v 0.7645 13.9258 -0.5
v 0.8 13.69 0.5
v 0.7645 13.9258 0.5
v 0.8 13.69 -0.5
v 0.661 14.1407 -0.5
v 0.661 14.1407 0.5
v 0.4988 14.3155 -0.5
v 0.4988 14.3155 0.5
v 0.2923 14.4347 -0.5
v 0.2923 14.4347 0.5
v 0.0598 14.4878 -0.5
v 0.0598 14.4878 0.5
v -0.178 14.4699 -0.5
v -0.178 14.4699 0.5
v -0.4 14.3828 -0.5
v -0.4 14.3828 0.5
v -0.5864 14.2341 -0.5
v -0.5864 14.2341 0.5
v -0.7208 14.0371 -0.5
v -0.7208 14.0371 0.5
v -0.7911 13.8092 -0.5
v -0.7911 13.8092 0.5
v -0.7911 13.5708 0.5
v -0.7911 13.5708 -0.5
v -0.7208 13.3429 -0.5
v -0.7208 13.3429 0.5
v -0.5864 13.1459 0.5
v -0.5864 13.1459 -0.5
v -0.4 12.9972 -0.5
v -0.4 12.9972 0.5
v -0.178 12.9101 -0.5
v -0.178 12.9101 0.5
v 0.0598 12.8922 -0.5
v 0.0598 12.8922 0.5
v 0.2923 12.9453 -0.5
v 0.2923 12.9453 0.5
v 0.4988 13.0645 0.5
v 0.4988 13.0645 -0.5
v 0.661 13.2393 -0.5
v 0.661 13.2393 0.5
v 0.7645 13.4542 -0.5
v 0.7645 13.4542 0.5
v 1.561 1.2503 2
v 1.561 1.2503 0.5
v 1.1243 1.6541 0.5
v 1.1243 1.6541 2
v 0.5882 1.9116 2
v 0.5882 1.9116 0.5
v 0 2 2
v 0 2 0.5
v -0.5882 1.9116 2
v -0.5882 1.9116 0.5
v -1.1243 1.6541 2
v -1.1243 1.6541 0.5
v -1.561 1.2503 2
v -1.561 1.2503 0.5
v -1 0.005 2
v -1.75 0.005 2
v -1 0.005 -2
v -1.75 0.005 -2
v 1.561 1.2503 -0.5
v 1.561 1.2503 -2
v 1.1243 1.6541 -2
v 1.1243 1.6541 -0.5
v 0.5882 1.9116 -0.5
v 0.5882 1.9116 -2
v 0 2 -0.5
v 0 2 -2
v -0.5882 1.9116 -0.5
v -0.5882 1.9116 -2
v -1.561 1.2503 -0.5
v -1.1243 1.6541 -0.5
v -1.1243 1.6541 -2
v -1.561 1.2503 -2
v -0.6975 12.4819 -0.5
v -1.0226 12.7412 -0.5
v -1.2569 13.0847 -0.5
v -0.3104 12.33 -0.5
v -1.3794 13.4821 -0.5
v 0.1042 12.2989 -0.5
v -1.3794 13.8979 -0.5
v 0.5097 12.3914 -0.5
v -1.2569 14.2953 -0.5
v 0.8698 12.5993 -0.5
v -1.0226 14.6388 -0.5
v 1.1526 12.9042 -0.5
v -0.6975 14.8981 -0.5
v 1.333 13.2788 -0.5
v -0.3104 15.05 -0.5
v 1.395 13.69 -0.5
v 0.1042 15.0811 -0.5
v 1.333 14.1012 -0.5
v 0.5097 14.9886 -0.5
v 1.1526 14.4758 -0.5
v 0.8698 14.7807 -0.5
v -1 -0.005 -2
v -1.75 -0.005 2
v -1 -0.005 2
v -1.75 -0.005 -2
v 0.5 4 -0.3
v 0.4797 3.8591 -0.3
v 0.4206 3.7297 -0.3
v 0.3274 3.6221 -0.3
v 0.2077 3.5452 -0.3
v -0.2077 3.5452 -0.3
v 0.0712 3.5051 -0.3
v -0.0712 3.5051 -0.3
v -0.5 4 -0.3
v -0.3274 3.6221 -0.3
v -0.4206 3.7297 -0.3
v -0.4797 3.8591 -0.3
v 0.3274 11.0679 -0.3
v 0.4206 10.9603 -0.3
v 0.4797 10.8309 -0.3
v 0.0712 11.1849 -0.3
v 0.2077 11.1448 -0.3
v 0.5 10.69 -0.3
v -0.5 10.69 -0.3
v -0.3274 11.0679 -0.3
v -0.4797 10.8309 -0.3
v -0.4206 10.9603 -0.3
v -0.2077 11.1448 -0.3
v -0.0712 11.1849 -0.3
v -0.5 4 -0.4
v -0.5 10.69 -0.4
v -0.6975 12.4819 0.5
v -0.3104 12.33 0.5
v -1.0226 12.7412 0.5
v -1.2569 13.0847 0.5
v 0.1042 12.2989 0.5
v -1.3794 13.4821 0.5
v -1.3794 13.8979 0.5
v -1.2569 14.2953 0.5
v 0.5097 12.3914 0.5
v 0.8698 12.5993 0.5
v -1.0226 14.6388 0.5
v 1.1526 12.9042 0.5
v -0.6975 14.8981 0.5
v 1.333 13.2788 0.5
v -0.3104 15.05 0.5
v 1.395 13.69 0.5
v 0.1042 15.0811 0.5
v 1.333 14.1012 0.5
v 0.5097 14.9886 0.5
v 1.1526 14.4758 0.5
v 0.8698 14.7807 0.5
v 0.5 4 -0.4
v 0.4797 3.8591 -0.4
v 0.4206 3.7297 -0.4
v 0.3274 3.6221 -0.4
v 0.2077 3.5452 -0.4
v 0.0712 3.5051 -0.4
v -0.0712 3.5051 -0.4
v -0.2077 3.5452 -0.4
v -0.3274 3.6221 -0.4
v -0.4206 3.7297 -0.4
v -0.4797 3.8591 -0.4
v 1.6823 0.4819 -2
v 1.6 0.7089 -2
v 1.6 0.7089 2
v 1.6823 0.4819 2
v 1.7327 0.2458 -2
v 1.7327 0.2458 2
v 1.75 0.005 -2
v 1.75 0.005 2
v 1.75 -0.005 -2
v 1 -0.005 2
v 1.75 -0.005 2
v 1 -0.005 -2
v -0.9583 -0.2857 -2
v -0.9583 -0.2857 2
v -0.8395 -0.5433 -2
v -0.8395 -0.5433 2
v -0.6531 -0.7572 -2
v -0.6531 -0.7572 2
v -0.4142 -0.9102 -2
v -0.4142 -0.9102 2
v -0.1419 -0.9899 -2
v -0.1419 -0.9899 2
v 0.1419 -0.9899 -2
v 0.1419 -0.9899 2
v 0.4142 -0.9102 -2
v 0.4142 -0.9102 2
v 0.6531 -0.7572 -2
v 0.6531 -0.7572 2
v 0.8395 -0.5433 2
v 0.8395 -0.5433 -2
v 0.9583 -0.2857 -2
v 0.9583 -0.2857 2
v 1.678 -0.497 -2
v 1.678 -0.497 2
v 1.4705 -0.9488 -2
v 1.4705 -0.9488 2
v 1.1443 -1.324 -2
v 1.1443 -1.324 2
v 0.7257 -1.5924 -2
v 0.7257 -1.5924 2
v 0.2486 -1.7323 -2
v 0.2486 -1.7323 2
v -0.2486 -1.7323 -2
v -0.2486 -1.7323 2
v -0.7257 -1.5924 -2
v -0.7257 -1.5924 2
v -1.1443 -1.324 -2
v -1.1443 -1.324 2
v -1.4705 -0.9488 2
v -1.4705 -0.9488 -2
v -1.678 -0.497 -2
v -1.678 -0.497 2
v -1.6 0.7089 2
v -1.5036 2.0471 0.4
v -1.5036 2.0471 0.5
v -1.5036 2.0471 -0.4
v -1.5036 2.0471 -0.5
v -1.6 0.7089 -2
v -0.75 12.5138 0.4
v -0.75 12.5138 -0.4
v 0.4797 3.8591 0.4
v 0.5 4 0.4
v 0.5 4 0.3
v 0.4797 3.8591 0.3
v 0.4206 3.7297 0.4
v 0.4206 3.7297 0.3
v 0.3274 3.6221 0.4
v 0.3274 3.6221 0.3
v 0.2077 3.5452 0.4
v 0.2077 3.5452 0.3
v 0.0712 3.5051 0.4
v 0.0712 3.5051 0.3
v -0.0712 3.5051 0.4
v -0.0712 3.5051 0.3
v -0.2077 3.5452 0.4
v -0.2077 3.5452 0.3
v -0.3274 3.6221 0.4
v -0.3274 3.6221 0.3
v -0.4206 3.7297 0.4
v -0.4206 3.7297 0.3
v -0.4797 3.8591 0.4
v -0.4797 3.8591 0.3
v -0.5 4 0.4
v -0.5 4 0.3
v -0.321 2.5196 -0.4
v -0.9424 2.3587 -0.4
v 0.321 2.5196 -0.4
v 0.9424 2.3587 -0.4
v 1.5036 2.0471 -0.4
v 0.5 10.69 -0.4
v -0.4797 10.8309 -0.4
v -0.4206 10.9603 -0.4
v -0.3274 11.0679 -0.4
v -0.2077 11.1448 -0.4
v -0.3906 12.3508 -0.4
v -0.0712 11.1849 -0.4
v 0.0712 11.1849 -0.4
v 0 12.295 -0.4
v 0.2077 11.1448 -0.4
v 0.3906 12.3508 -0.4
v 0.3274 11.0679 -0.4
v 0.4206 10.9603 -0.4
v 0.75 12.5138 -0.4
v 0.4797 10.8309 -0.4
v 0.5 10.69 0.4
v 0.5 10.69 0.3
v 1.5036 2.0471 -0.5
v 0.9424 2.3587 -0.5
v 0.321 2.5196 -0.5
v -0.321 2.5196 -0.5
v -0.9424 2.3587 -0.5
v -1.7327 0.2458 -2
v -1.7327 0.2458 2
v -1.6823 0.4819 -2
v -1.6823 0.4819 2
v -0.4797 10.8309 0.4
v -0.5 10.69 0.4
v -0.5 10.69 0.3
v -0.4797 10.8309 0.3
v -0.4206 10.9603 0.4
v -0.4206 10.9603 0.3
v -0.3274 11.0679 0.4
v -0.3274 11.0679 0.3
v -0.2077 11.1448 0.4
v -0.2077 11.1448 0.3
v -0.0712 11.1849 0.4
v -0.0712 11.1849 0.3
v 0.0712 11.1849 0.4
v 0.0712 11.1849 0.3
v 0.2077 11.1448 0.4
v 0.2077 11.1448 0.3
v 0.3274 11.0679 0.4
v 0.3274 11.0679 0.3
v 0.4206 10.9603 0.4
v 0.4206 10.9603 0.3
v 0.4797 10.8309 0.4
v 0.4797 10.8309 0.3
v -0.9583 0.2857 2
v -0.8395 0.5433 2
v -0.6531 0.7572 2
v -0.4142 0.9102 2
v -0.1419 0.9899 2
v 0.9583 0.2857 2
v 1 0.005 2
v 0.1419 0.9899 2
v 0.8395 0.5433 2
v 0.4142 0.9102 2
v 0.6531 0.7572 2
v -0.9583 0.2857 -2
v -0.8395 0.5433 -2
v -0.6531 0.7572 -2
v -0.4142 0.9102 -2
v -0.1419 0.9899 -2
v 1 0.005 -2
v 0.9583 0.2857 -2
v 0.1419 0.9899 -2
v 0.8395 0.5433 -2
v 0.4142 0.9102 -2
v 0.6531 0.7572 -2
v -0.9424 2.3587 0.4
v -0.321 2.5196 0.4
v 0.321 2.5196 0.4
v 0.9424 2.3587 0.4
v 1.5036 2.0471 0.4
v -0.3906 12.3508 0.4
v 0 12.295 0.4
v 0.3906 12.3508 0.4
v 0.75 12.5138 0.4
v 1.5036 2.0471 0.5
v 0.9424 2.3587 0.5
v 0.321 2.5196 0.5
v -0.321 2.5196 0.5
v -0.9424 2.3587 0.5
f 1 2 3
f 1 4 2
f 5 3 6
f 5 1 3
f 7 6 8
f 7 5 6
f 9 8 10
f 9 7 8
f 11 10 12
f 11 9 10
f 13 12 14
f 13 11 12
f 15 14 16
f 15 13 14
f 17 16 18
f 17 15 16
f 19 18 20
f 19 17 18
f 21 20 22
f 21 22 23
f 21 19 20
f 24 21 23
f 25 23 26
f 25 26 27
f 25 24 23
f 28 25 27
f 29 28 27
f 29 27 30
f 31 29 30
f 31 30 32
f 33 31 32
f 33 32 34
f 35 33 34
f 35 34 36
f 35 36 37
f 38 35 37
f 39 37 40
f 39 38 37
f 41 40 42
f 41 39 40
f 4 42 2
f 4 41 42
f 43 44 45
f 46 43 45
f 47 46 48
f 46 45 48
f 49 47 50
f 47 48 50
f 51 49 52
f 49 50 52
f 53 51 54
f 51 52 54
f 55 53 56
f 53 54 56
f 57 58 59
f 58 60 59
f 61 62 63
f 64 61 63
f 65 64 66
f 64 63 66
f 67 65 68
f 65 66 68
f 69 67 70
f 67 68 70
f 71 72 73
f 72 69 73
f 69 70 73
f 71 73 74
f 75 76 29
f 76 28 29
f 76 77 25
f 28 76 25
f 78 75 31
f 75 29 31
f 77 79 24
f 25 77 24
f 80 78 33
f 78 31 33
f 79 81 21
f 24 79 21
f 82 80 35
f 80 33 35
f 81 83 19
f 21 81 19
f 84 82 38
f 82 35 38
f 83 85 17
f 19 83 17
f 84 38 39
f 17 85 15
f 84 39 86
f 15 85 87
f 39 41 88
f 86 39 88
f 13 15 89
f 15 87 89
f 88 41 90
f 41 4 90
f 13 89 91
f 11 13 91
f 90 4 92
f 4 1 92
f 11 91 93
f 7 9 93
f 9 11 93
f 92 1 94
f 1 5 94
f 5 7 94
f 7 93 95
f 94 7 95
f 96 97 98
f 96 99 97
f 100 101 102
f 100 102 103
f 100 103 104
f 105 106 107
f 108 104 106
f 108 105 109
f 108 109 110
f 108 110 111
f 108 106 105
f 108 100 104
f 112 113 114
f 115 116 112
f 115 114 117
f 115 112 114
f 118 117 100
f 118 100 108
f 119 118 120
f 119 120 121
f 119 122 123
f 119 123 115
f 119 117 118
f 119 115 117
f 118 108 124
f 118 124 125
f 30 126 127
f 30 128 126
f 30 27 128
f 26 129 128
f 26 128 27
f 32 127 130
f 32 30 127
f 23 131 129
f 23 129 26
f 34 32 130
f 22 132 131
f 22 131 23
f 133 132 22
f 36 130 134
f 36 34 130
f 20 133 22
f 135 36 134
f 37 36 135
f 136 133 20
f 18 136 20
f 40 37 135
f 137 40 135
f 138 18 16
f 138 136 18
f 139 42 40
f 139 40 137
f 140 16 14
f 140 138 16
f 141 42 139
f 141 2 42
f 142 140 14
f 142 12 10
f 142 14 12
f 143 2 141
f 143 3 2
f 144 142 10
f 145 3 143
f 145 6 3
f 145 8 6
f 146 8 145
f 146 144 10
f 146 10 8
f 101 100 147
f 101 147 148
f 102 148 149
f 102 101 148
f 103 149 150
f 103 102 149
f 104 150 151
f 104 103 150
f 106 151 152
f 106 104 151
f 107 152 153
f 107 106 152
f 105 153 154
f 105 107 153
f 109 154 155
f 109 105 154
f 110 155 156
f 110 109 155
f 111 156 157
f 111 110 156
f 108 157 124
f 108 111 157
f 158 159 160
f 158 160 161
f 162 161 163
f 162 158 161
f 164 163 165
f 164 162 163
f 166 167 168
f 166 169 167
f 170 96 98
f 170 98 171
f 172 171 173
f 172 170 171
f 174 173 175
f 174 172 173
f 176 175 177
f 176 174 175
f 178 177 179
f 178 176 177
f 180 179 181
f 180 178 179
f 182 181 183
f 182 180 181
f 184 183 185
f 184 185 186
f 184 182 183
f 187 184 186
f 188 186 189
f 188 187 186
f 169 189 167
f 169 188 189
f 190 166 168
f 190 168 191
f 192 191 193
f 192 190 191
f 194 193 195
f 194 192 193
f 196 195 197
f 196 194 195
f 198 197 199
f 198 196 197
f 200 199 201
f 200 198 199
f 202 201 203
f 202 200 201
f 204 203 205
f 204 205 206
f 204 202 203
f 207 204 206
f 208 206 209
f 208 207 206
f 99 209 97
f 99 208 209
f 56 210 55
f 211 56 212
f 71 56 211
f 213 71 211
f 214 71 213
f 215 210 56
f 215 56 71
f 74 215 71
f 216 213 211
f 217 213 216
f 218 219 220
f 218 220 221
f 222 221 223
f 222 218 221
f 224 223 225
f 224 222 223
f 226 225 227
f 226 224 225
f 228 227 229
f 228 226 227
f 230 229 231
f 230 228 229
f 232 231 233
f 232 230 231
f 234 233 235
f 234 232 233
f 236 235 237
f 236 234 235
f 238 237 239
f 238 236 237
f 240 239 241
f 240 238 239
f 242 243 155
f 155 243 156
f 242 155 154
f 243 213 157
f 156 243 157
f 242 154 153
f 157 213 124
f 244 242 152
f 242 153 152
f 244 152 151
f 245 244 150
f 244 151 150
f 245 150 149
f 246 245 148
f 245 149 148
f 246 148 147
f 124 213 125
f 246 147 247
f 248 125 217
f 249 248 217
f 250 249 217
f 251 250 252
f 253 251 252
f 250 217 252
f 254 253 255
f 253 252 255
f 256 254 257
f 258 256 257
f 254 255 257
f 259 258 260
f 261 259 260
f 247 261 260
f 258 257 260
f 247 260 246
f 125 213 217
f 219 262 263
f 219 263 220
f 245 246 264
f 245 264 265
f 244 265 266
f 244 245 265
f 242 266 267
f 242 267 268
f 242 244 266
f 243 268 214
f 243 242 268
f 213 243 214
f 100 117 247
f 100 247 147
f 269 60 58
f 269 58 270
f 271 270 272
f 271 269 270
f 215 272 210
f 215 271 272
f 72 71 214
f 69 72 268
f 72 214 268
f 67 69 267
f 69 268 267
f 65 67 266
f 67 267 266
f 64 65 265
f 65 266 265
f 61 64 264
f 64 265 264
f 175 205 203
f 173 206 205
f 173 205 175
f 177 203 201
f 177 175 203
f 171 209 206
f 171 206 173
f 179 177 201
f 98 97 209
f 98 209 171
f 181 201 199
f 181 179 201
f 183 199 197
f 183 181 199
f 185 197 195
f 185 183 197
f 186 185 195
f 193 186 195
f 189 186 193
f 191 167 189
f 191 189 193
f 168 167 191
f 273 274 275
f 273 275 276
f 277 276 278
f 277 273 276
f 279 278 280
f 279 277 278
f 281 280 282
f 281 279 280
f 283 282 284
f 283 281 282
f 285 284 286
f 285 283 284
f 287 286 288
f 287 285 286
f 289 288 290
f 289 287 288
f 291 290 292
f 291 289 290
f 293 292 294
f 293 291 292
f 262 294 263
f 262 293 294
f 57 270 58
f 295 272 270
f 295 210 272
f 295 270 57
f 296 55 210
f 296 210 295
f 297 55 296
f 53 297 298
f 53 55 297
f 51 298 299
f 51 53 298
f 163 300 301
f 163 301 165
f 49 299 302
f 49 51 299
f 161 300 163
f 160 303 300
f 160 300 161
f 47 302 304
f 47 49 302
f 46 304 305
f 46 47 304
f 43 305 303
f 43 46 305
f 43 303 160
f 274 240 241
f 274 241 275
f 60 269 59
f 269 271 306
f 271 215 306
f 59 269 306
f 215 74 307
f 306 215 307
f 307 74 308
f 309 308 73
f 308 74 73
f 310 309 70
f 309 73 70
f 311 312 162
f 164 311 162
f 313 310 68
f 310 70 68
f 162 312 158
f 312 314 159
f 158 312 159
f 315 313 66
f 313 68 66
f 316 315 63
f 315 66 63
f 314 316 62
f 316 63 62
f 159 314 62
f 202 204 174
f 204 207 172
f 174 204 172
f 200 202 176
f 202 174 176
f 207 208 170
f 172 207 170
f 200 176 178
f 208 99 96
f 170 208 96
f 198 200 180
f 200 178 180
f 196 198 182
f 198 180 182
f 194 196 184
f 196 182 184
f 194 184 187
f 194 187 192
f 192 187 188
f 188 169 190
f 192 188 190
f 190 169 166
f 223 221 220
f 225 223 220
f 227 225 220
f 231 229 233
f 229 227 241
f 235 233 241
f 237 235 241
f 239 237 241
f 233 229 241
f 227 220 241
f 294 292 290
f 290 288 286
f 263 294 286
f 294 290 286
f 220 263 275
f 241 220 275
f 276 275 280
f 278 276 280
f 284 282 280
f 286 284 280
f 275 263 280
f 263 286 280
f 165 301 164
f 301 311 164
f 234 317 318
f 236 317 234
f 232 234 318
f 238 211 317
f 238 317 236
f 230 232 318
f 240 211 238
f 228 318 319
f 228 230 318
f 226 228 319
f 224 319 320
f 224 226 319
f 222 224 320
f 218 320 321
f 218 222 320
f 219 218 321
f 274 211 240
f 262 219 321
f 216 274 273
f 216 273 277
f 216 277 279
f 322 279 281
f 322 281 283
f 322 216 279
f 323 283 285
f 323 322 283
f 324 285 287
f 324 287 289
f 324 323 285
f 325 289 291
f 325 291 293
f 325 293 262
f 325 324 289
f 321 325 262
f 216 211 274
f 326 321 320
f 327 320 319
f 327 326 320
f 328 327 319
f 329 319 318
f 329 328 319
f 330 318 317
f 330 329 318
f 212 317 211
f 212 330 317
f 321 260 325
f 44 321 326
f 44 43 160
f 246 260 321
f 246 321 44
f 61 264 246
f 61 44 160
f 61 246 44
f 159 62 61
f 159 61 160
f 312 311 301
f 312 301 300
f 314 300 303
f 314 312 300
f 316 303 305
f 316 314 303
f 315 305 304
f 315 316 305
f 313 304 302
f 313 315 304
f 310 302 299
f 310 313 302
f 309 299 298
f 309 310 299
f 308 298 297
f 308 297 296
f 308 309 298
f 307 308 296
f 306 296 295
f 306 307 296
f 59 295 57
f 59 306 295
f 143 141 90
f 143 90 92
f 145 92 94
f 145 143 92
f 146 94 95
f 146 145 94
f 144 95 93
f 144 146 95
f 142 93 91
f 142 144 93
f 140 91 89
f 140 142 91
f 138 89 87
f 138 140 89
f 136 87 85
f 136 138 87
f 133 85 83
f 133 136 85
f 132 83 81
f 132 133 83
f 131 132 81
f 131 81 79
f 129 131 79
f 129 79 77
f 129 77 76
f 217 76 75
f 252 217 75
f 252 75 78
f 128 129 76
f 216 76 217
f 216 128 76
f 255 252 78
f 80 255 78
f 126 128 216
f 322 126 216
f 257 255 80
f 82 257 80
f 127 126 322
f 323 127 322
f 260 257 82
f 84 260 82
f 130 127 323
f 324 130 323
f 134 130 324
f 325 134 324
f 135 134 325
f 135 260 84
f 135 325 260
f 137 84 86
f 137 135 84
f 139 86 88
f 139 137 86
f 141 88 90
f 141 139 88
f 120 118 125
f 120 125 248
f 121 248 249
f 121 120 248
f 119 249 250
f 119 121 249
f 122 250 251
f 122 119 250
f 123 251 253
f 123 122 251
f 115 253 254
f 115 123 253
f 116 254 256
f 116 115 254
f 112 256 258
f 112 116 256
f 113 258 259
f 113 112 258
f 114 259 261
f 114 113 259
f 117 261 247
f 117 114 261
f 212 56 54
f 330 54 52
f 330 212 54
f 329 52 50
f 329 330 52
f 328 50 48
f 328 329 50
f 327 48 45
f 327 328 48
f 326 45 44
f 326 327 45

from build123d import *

# Parameters (mm, degrees)
SKETCH1_R                = 1.395
SKETCH1_R_2              = 0.8
BOSS_EXTRUDE1_DEPTH      = 0.5
SKETCH1_R_3              = 2.54
SKETCH1_R_4              = 1
BOSS_EXTRUDE1_2_DEPTH    = 0.5
BOSS_EXTRUDE2_DEPTH      = 0.4
BOSS_EXTRUDE3_DEPTH      = 0.3
BOSS_EXTRUDE4_DEPTH      = 1.5
BOSS_EXTRUDE4_DEPTH_BACK = 2.5
SKETCH2_R                = 2
SKETCH2_R_2              = 1
CUT_EXTRUDE1_DEPTH       = 16.427534638
CUT_EXTRUDE1_DEPTH_BACK  = 16.427534638
CUT_EXTRUDE2_DEPTH       = 16.317301492
CUT_EXTRUDE2_DEPTH_BACK  = 16.317301492
SKETCH4_W                = 5.880163942
SKETCH4_H                = 0.01


with BuildPart() as part:
    # Sketch1 → Boss-Extrude1 (new, symmetric)
    with BuildSketch(Plane.XY):
        with Locations((0, 13.69)):
            Circle(SKETCH1_R)
        with Locations((0, 13.69)):
            Circle(SKETCH1_R_2, mode=Mode.SUBTRACT)
    extrude(amount=BOSS_EXTRUDE1_DEPTH, both=True)



with BuildPart() as body_2:
    # Sketch1 → Boss-Extrude1 2 (new, symmetric)
    with BuildSketch(Plane.XY):
        Circle(SKETCH1_R_3)
        Circle(SKETCH1_R_4, mode=Mode.SUBTRACT)
    extrude(amount=BOSS_EXTRUDE1_2_DEPTH, both=True)


with BuildPart() as part_1:
    add(part.part)

    add(body_2.part)  # Boss-Extrude2 merges body 2
    # Sketch1<3> → Boss-Extrude2 (add, symmetric)
    with BuildSketch(Plane.XY):
        with BuildLine():
            ThreePointArc((0.75, 12.513766605), (0, 12.295), (-0.75, 12.513766605))
            Line((-0.75, 12.513766605), (-1.65, 1.931087776))
            ThreePointArc((-1.65, 1.931087776), (0, 2.54), (1.65, 1.931087776))
            Line((1.65, 1.931087776), (0.75, 12.513766605))
        make_face()
        with BuildLine():
            ThreePointArc((-0.5, 10.69), (0, 11.19), (0.5, 10.69))
            Line((0.5, 10.69), (0.5, 4))
            ThreePointArc((0.5, 4), (0, 3.5), (-0.5, 4))
            Line((-0.5, 4), (-0.5, 10.69))
        make_face(mode=Mode.SUBTRACT)
    extrude(amount=BOSS_EXTRUDE2_DEPTH, both=True)

    # Sketch1<4> → Boss-Extrude3 (add, symmetric)
    with BuildSketch(Plane.XY):
        with BuildLine():
            Line((0.5, 10.69), (0.5, 4))
            ThreePointArc((0.5, 4), (0, 3.5), (-0.5, 4))
            Line((-0.5, 4), (-0.5, 10.69))
            ThreePointArc((-0.5, 10.69), (0, 11.19), (0.5, 10.69))
        make_face()
    extrude(amount=BOSS_EXTRUDE3_DEPTH, both=True)

    # Sketch2 → Boss-Extrude4 (add, two sides: drawn at the far end of the back side and taken through both)
    with BuildSketch(Plane.XY.offset(0.5).offset(-BOSS_EXTRUDE4_DEPTH_BACK)):
        Circle(SKETCH2_R)
        Circle(SKETCH2_R_2, mode=Mode.SUBTRACT)
    extrude(amount=BOSS_EXTRUDE4_DEPTH + BOSS_EXTRUDE4_DEPTH_BACK)

    # Sketch3 → Cut-Extrude1 (cut, two sides: drawn at the far end of the back side and taken through both)
    with BuildSketch(Plane.XY.offset(-CUT_EXTRUDE1_DEPTH_BACK)):
        with BuildLine():
            Line((-0.75, 12.513766605), (-3.040617263, 1.733391663))
            ThreePointArc((-3.040617263, 1.733391663), (0, -3.5), (3.040617263, 1.733391663))
            Line((3.040617263, 1.733391663), (0.75, 12.513766605))
            Line((0.75, 12.513766605), (1.6, 0.708872344))
            ThreePointArc((1.6, 0.708872344), (0, -1.75), (-1.6, 0.708872344))
            Line((-1.6, 0.708872344), (-0.75, 12.513766605))
        make_face()
    extrude(amount=CUT_EXTRUDE1_DEPTH + CUT_EXTRUDE1_DEPTH_BACK, mode=Mode.SUBTRACT)

    # Sketch4 → Cut-Extrude2 (cut, two sides: drawn at the far end of the back side and taken through both)
    with BuildSketch(Plane.XY.offset(-CUT_EXTRUDE2_DEPTH_BACK)):
        Rectangle(SKETCH4_W, SKETCH4_H)
    extrude(amount=CUT_EXTRUDE2_DEPTH + CUT_EXTRUDE2_DEPTH_BACK, mode=Mode.SUBTRACT)


with BuildPart() as cut_extrude2_piece_1:
    # of the separate pieces the step leaves, piece 1, a body of its own (cut_extrude2_pieces)
    add(part_1.part.solids().sort_by_distance((1.503641437, 2.047110751, -0.5))[0])


with BuildPart() as cut_extrude2_piece_2:
    # of the separate pieces the step leaves, piece 2, a body of its own (cut_extrude2_pieces)
    add(part_1.part.solids().sort_by_distance((1.749992857, -0.005, -2))[0])


solid = Compound([cut_extrude2_piece_1.part, cut_extrude2_piece_2.part])
